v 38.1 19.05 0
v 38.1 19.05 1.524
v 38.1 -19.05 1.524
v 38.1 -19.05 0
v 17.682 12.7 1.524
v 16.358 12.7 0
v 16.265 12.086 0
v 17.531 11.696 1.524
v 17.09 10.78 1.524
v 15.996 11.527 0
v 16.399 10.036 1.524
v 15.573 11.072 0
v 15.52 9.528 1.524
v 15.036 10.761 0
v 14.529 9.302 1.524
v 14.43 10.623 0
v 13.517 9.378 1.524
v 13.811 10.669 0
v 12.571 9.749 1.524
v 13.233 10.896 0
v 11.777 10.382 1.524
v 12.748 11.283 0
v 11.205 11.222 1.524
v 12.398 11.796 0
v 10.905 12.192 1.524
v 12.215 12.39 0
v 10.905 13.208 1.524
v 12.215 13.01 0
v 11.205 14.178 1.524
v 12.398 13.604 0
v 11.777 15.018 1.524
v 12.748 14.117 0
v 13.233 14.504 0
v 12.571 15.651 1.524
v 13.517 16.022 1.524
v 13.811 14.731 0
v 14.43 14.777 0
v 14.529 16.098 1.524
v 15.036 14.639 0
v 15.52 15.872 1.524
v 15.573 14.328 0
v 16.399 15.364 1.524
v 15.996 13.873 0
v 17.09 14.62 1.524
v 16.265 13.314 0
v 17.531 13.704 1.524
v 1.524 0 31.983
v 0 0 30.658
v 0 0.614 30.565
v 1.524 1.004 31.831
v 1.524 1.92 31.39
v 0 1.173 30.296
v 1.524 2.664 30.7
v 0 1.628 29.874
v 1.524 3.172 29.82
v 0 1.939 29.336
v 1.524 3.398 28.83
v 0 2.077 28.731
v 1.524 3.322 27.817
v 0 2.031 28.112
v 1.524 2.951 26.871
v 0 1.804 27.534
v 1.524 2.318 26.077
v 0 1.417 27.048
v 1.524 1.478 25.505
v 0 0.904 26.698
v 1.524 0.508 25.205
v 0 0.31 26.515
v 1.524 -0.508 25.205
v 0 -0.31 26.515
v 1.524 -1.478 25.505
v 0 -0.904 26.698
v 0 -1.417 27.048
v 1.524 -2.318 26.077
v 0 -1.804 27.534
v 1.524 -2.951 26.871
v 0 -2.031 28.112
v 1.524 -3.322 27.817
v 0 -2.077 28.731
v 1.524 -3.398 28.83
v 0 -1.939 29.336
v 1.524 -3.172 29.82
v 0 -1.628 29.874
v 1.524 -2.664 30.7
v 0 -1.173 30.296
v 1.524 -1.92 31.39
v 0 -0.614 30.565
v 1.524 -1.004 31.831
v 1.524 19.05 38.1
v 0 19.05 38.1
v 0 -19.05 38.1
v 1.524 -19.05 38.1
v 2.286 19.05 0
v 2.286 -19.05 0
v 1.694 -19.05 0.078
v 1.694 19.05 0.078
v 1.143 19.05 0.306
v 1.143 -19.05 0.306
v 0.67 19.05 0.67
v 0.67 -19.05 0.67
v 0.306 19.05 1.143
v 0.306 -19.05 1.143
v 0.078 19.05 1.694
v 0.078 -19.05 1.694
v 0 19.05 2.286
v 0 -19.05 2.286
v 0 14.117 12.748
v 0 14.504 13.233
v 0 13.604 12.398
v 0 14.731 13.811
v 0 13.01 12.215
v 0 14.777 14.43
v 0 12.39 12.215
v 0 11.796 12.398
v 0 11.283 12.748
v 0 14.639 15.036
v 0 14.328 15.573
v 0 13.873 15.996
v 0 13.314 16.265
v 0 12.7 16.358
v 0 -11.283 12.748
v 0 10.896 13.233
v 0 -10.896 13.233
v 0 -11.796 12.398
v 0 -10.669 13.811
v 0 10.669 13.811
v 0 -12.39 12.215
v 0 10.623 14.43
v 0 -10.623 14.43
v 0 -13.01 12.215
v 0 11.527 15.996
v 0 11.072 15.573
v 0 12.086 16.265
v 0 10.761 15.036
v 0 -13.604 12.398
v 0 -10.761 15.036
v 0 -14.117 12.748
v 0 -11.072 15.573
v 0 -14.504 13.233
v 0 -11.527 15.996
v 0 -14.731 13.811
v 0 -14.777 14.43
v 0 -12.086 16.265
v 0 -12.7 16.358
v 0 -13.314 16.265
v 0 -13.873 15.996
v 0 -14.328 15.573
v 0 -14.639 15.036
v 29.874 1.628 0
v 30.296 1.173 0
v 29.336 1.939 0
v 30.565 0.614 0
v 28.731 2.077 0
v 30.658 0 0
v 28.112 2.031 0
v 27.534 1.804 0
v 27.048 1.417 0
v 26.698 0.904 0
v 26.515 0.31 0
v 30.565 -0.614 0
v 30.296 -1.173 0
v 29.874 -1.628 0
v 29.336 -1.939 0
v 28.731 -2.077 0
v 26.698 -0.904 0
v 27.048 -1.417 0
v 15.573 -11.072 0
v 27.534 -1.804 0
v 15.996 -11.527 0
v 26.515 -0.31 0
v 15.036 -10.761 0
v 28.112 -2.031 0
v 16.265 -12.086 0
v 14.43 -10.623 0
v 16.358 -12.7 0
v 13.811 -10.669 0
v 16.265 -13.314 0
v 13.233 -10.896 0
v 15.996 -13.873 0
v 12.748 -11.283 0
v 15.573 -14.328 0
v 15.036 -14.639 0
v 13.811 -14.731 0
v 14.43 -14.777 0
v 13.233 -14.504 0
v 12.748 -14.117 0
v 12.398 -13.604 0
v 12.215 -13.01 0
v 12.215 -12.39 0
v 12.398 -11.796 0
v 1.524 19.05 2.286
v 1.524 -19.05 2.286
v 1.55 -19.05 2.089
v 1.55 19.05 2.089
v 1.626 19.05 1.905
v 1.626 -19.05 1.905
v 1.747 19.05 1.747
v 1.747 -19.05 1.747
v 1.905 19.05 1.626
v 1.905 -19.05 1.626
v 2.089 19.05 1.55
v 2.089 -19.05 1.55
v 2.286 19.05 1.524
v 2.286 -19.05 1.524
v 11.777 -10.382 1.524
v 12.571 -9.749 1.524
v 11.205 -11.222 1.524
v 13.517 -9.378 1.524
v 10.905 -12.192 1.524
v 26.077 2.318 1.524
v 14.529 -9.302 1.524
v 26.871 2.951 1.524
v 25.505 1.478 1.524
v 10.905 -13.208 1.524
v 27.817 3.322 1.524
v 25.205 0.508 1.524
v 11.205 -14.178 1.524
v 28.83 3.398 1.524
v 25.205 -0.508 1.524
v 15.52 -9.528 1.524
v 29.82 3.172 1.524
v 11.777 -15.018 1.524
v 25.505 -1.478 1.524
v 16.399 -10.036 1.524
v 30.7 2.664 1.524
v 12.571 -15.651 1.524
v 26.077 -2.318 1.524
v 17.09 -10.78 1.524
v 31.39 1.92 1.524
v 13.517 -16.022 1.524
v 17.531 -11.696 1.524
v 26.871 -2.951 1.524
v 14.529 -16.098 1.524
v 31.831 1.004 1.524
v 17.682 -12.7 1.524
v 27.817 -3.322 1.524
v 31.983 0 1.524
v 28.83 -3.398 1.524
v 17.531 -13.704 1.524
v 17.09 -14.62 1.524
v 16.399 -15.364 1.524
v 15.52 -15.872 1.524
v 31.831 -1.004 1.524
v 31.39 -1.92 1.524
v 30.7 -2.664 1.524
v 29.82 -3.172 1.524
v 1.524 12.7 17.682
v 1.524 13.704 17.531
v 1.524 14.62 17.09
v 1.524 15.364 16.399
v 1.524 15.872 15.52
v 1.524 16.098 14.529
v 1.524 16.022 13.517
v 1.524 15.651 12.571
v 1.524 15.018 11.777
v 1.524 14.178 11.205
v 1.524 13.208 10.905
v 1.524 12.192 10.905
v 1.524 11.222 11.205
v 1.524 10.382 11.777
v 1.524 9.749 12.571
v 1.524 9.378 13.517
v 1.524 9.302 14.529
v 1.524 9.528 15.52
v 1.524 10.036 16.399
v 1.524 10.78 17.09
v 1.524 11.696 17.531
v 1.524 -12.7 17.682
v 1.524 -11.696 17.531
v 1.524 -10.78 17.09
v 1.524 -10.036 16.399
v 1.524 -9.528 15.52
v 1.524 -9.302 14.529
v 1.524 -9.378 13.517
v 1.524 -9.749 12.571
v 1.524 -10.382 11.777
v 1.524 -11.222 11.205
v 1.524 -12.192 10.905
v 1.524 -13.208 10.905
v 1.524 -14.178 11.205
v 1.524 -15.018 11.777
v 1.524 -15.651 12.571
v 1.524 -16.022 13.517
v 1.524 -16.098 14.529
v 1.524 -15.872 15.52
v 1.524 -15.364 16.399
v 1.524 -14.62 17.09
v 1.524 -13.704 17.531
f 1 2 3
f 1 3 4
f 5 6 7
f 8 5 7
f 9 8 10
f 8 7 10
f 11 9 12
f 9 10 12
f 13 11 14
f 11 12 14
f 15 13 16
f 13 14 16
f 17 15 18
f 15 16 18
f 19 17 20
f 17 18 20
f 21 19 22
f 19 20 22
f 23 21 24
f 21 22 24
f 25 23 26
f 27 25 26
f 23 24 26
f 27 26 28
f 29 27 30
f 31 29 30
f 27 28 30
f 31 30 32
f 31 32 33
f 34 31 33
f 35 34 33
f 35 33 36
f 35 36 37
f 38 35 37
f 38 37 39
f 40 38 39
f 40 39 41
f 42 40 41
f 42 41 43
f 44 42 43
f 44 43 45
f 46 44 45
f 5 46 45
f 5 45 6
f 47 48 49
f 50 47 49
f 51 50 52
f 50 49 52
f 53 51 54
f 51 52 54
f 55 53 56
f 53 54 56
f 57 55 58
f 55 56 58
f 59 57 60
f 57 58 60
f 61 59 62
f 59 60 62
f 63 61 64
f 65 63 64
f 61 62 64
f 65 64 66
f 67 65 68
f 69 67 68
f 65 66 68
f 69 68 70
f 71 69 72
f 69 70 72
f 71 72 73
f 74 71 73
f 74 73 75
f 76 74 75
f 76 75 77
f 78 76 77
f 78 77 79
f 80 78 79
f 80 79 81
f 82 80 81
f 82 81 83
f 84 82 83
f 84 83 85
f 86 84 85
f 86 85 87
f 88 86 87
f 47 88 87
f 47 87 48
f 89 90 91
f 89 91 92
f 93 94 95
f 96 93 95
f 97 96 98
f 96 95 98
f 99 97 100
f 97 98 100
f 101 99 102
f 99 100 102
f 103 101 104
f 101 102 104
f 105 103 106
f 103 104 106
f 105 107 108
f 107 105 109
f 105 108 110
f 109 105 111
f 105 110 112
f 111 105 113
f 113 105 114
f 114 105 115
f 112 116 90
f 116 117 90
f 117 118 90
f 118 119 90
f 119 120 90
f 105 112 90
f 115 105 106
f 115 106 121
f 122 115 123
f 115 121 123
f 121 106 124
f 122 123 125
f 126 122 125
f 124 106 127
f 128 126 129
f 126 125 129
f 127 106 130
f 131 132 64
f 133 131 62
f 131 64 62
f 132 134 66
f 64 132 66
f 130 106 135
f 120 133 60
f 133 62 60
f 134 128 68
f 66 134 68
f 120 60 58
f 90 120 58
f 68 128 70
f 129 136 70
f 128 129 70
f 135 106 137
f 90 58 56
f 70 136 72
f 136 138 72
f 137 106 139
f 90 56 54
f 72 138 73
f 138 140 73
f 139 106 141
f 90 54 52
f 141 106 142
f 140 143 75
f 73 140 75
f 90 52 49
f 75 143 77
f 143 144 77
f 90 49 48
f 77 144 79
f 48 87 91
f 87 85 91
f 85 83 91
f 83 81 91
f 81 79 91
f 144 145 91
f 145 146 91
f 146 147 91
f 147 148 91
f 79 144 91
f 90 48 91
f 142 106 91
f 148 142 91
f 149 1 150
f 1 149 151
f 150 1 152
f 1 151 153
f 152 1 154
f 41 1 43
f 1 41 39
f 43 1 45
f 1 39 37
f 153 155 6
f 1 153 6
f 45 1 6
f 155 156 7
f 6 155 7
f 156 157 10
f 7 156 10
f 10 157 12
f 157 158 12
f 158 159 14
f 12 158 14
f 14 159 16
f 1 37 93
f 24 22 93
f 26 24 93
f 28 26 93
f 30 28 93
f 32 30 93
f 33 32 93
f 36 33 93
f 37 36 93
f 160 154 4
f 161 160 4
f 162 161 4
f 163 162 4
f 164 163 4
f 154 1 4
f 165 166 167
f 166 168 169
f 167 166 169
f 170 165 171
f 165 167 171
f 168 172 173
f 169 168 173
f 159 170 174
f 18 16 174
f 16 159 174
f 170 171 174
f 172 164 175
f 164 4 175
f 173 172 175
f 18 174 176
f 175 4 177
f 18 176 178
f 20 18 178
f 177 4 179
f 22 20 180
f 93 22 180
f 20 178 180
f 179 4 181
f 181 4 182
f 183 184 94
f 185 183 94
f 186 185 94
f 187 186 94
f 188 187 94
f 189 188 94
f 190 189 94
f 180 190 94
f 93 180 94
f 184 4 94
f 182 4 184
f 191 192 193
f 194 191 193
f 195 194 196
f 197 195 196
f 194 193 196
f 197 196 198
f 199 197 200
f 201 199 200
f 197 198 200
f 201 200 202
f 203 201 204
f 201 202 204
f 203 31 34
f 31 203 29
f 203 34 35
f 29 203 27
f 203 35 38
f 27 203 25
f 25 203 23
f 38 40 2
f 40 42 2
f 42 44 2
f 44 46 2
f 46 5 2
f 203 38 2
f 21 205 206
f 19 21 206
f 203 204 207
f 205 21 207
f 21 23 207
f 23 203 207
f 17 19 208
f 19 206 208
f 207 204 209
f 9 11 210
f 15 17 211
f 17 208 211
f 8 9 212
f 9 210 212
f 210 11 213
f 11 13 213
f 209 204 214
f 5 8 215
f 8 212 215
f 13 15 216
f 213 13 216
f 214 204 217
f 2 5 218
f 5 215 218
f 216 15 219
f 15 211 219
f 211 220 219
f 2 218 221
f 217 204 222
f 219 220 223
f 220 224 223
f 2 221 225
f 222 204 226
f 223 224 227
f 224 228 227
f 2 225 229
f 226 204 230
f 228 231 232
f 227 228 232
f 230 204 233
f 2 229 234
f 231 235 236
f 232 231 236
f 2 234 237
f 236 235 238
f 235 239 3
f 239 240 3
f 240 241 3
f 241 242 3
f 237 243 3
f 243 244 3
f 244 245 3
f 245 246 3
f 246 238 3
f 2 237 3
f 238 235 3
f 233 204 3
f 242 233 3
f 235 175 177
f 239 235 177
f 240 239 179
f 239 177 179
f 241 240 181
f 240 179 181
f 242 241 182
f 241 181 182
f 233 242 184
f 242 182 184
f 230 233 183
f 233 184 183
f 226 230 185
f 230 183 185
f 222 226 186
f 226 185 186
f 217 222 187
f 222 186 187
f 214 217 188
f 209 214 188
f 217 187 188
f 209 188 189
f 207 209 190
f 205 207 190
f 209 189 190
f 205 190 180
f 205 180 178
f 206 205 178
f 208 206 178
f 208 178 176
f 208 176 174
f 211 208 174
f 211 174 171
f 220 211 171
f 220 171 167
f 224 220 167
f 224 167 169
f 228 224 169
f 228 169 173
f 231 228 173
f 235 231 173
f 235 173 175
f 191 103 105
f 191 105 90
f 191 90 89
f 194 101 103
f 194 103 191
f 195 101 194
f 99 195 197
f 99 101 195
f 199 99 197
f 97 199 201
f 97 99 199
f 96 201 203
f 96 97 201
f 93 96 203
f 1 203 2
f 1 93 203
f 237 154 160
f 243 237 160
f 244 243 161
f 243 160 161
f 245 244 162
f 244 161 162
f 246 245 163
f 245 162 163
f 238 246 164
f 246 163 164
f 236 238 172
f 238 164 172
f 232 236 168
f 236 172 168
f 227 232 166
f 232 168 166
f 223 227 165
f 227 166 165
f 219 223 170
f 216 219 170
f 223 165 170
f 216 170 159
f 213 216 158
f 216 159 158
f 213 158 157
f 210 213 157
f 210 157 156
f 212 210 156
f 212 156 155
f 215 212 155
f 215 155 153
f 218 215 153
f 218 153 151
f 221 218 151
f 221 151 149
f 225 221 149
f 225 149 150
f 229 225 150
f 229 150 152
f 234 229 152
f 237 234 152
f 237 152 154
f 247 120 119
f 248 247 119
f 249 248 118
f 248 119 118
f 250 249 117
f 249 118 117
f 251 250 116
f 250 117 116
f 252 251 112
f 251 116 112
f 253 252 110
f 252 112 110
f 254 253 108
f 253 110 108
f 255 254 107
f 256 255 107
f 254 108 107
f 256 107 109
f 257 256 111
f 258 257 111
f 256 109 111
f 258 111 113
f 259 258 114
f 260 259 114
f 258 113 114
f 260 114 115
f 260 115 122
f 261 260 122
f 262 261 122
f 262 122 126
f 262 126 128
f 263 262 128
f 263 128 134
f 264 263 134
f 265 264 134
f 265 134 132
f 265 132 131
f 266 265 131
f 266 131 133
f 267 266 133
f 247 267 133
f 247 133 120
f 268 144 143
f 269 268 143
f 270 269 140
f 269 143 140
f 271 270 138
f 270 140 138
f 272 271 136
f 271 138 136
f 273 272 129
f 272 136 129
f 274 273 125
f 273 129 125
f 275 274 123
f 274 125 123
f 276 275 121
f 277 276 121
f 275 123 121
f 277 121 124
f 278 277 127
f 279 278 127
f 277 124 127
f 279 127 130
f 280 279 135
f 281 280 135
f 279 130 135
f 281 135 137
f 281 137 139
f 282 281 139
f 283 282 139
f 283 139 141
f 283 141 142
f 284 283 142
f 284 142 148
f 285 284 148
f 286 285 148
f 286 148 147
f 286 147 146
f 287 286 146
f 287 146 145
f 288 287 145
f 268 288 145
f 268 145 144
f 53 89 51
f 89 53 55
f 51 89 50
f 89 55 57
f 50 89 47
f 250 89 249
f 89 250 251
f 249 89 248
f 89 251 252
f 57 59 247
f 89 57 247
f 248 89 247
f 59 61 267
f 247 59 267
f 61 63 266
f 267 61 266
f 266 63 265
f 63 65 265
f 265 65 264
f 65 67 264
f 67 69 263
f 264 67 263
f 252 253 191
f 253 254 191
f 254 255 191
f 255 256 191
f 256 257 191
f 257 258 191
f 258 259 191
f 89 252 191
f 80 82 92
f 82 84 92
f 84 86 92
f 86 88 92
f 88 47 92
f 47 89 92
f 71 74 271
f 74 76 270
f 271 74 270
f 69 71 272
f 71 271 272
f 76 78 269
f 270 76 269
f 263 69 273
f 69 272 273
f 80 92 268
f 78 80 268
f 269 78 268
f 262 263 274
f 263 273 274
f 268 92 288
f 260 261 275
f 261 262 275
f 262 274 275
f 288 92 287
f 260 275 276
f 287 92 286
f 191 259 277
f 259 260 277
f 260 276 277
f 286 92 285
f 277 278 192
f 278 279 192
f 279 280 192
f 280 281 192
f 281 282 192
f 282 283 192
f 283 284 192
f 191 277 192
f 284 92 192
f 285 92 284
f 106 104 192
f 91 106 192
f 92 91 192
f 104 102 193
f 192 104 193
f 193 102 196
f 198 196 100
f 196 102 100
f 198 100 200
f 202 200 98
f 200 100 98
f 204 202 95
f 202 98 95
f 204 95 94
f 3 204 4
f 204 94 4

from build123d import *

# Parameters (mm, degrees)
EXTRUDE_THIN1_START          = -19.05
EXTRUDE_THIN1_DEPTH          = 38.1
SKETCH4_R                    = 2.0828
EXTRUDE3_DEPTH               = 57.145492036
SKETCH5_R                    = 2.0828
CUT_EXTRUDE1_DEPTH           = 2.54
CUT_EXTRUDE1_DRAFT           = 41
CUT_EXTRUDE1_PROFILE_2_DEPTH = 2.54
CUT_EXTRUDE1_PROFILE_2_DRAFT = 41
CUT_EXTRUDE1_PROFILE_3_DEPTH = 2.54
CUT_EXTRUDE1_PROFILE_3_DRAFT = 41
MIRROR1_COPY_1_SKETCH_R      = 2.0828
MIRROR1_COPY_1_DEPTH         = 2.54
MIRROR1_COPY_1_DRAFT         = 41
MIRROR1_COPY_2_SKETCH_R      = 2.0828
MIRROR1_COPY_2_DEPTH         = 2.54
MIRROR1_COPY_2_DRAFT         = 41
MIRROR1_COPY_3_SKETCH_R      = 2.0828
MIRROR1_COPY_3_DEPTH         = 2.54
MIRROR1_COPY_3_DRAFT         = 41
MIRROR1_COPY_4_SKETCH_R      = 2.0828
MIRROR1_COPY_4_DEPTH         = 2.54
MIRROR1_COPY_4_DRAFT         = 41
MIRROR1_COPY_5_SKETCH_R      = 2.0828
MIRROR1_COPY_5_DEPTH         = 2.54
MIRROR1_COPY_5_DRAFT         = 41


# Read off the part's stored shape, not the designer's step: Extrude-Thin1
with BuildPart() as part:
    # Extrude-Thin1 outline → Extrude-Thin1 (new body)
    with BuildSketch(Plane(origin=(0, 0, 0), x_dir=(1, 0, 0), z_dir=(0, 1, 0)).offset(EXTRUDE_THIN1_START)):
        with BuildLine():
            Line((2.286, -1.524), (38.1, -1.524))
            Line((38.1, -1.524), (38.1, 0))
            Line((38.1, 0), (2.286, 0))
            ThreePointArc((2.286, 0), (0.669553898, -0.669553898), (0, -2.286))
            Line((0, -2.286), (0, -38.1))
            Line((0, -38.1), (1.524, -38.1))
            Line((1.524, -38.1), (1.524, -2.286))
            ThreePointArc((1.524, -2.286), (1.747184633, -1.747184633), (2.286, -1.524))
        make_face()
    extrude(amount=EXTRUDE_THIN1_DEPTH)

    # Sketch4 → Extrude3 (cut, through all)
    with BuildSketch(Plane(origin=(1.524, 0, 0), x_dir=(0, 0, -1), z_dir=(1, 0, 0))):
        with Locations((-28.575, 0)):
            Circle(SKETCH4_R)
        with Locations((-14.2748, 12.7)):
            Circle(SKETCH4_R)
        with Locations((-14.2748, -12.7)):
            Circle(SKETCH4_R)
    extrude3 = extrude(amount=-EXTRUDE3_DEPTH, mode=Mode.SUBTRACT)


with BuildPart() as cut_extrude1_tool:
    # Sketch5 → Cut-Extrude1 (with draft: the straight prism first)
    with BuildSketch(Plane.ZY):
        with Locations((14.2748, -12.7)):
            Circle(SKETCH5_R)
    extrude(amount=-CUT_EXTRUDE1_DEPTH)
    # Cut-Extrude1: the draft: its side faces are tilted about the plane it starts from
    cut_extrude1_sides = [cut_extrude1_tool.faces().sort_by_distance(p)[0] for p in [
        (1.27, -12.7, 12.192),
    ]]
    draft(cut_extrude1_sides, Plane.ZY, CUT_EXTRUDE1_DRAFT)


with BuildPart() as part_1:
    add(part.part)

    # Cut-Extrude1: cut by cut_extrude1_tool
    add(cut_extrude1_tool.part, mode=Mode.SUBTRACT)


with BuildPart() as cut_extrude1_profile_2_tool:
    # Sketch5 → Cut-Extrude1 profile 2 (with draft: the straight prism first)
    with BuildSketch(Plane.ZY):
        with Locations((14.2748, 12.7)):
            Circle(SKETCH5_R)
    extrude(amount=-CUT_EXTRUDE1_PROFILE_2_DEPTH)
    # Cut-Extrude1 profile 2: the draft: its side faces are tilted about the plane it starts from
    cut_extrude1_profile_2_sides = [cut_extrude1_profile_2_tool.faces().sort_by_distance(p)[0] for p in [
        (1.27, 12.7, 12.192),
    ]]
    draft(cut_extrude1_profile_2_sides, Plane.ZY, CUT_EXTRUDE1_PROFILE_2_DRAFT)


with BuildPart() as part_2:
    add(part_1.part)

    # Cut-Extrude1 profile 2: cut by cut_extrude1_profile_2_tool
    add(cut_extrude1_profile_2_tool.part, mode=Mode.SUBTRACT)


with BuildPart() as cut_extrude1_profile_3_tool:
    # Sketch5 → Cut-Extrude1 profile 3 (with draft: the straight prism first)
    with BuildSketch(Plane.ZY):
        with Locations((28.575, 0)):
            Circle(SKETCH5_R)
    extrude(amount=-CUT_EXTRUDE1_PROFILE_3_DEPTH)
    # Cut-Extrude1 profile 3: the draft: its side faces are tilted about the plane it starts from
    cut_extrude1_profile_3_sides = [cut_extrude1_profile_3_tool.faces().sort_by_distance(p)[0] for p in [
        (1.27, 0, 26.4922),
    ]]
    draft(cut_extrude1_profile_3_sides, Plane.ZY, CUT_EXTRUDE1_PROFILE_3_DRAFT)


with BuildPart() as part_3:
    add(part_2.part)

    # Cut-Extrude1 profile 3: cut by cut_extrude1_profile_3_tool
    add(cut_extrude1_profile_3_tool.part, mode=Mode.SUBTRACT)

    # Mirror1: Extrude3 across plane
    add(extrude3.mirror(Plane(origin=(0, 0, 0), x_dir=(0.7071067811865465, 0, 0.7071067811865486), z_dir=(-0.7071067811865488, 0, 0.7071067811865464))), mode=Mode.SUBTRACT)


with BuildPart() as mirror1_copy_1_tool:
    # Mirror1 copy 1 sketch → Mirror1 copy 1 (with draft: the straight prism first)
    with BuildSketch(Plane(origin=(0, 0, 0), x_dir=(1, 0, 0), z_dir=(0, 0, -1))):
        with Locations((14.2748, 12.7)):
            Circle(MIRROR1_COPY_1_SKETCH_R)
    extrude(amount=-MIRROR1_COPY_1_DEPTH)
    # Mirror1 copy 1: the draft: its side faces are tilted about the plane it starts from
    mirror1_copy_1_sides = [mirror1_copy_1_tool.faces().sort_by_distance(p)[0] for p in [
        (12.192, -12.7, 1.27),
    ]]
    draft(mirror1_copy_1_sides, Plane(origin=(0, 0, 0), x_dir=(1, 0, 0), z_dir=(0, 0, -1)), MIRROR1_COPY_1_DRAFT)


with BuildPart() as part_4:
    add(part_3.part)

    # Mirror1 copy 1: cut by mirror1_copy_1_tool
    add(mirror1_copy_1_tool.part, mode=Mode.SUBTRACT)


with BuildPart() as mirror1_copy_2_tool:
    # Mirror1 copy 2 sketch → Mirror1 copy 2 (with draft: the straight prism first)
    with BuildSketch(Plane(origin=(0, 0, 0), x_dir=(1, 0, 0), z_dir=(0, 0, -1))):
        with Locations((14.2748, -12.7)):
            Circle(MIRROR1_COPY_2_SKETCH_R)
    extrude(amount=-MIRROR1_COPY_2_DEPTH)
    # Mirror1 copy 2: the draft: its side faces are tilted about the plane it starts from
    mirror1_copy_2_sides = [mirror1_copy_2_tool.faces().sort_by_distance(p)[0] for p in [
        (12.192, 12.7, 1.27),
    ]]
    draft(mirror1_copy_2_sides, Plane(origin=(0, 0, 0), x_dir=(1, 0, 0), z_dir=(0, 0, -1)), MIRROR1_COPY_2_DRAFT)


with BuildPart() as part_5:
    add(part_4.part)

    # Mirror1 copy 2: cut by mirror1_copy_2_tool
    add(mirror1_copy_2_tool.part, mode=Mode.SUBTRACT)


with BuildPart() as mirror1_copy_3_tool:
    # Mirror1 copy 3 sketch → Mirror1 copy 3 (with draft: the straight prism first)
    with BuildSketch(Plane(origin=(0, 0, 0), x_dir=(1, 0, 0), z_dir=(0, 0, -1))):
        with Locations((28.575, 0)):
            Circle(MIRROR1_COPY_3_SKETCH_R)
    extrude(amount=-MIRROR1_COPY_3_DEPTH)
    # Mirror1 copy 3: the draft: its side faces are tilted about the plane it starts from
    mirror1_copy_3_sides = [mirror1_copy_3_tool.faces().sort_by_distance(p)[0] for p in [
        (26.4922, 0, 1.27),
    ]]
    draft(mirror1_copy_3_sides, Plane(origin=(0, 0, 0), x_dir=(1, 0, 0), z_dir=(0, 0, -1)), MIRROR1_COPY_3_DRAFT)


with BuildPart() as part_6:
    add(part_5.part)

    # Mirror1 copy 3: cut by mirror1_copy_3_tool
    add(mirror1_copy_3_tool.part, mode=Mode.SUBTRACT)


with BuildPart() as mirror1_copy_4_tool:
    # Mirror1 copy 4 sketch → Mirror1 copy 4 (with draft: the straight prism first)
    with BuildSketch(Plane(origin=(0, 0, 0), x_dir=(1, 0, 0), z_dir=(0, 0, -1))):
        with Locations((14.2748, -12.7)):
            Circle(MIRROR1_COPY_4_SKETCH_R)
    extrude(amount=-MIRROR1_COPY_4_DEPTH)
    # Mirror1 copy 4: the draft: its side faces are tilted about the plane it starts from
    mirror1_copy_4_sides = [mirror1_copy_4_tool.faces().sort_by_distance(p)[0] for p in [
        (12.192, 12.7, 1.27),
    ]]
    draft(mirror1_copy_4_sides, Plane(origin=(0, 0, 0), x_dir=(1, 0, 0), z_dir=(0, 0, -1)), MIRROR1_COPY_4_DRAFT)


with BuildPart() as part_7:
    add(part_6.part)

    # Mirror1 copy 4: cut by mirror1_copy_4_tool
    add(mirror1_copy_4_tool.part, mode=Mode.SUBTRACT)


with BuildPart() as mirror1_copy_5_tool:
    # Mirror1 copy 5 sketch → Mirror1 copy 5 (with draft: the straight prism first)
    with BuildSketch(Plane(origin=(0, 0, 0), x_dir=(1, 0, 0), z_dir=(0, 0, -1))):
        with Locations((28.575, 0)):
            Circle(MIRROR1_COPY_5_SKETCH_R)
    extrude(amount=-MIRROR1_COPY_5_DEPTH)
    # Mirror1 copy 5: the draft: its side faces are tilted about the plane it starts from
    mirror1_copy_5_sides = [mirror1_copy_5_tool.faces().sort_by_distance(p)[0] for p in [
        (26.4922, 0, 1.27),
    ]]
    draft(mirror1_copy_5_sides, Plane(origin=(0, 0, 0), x_dir=(1, 0, 0), z_dir=(0, 0, -1)), MIRROR1_COPY_5_DRAFT)


with BuildPart() as part_8:
    add(part_7.part)

    # Mirror1 copy 5: cut by mirror1_copy_5_tool
    add(mirror1_copy_5_tool.part, mode=Mode.SUBTRACT)


solid = part_8.part
